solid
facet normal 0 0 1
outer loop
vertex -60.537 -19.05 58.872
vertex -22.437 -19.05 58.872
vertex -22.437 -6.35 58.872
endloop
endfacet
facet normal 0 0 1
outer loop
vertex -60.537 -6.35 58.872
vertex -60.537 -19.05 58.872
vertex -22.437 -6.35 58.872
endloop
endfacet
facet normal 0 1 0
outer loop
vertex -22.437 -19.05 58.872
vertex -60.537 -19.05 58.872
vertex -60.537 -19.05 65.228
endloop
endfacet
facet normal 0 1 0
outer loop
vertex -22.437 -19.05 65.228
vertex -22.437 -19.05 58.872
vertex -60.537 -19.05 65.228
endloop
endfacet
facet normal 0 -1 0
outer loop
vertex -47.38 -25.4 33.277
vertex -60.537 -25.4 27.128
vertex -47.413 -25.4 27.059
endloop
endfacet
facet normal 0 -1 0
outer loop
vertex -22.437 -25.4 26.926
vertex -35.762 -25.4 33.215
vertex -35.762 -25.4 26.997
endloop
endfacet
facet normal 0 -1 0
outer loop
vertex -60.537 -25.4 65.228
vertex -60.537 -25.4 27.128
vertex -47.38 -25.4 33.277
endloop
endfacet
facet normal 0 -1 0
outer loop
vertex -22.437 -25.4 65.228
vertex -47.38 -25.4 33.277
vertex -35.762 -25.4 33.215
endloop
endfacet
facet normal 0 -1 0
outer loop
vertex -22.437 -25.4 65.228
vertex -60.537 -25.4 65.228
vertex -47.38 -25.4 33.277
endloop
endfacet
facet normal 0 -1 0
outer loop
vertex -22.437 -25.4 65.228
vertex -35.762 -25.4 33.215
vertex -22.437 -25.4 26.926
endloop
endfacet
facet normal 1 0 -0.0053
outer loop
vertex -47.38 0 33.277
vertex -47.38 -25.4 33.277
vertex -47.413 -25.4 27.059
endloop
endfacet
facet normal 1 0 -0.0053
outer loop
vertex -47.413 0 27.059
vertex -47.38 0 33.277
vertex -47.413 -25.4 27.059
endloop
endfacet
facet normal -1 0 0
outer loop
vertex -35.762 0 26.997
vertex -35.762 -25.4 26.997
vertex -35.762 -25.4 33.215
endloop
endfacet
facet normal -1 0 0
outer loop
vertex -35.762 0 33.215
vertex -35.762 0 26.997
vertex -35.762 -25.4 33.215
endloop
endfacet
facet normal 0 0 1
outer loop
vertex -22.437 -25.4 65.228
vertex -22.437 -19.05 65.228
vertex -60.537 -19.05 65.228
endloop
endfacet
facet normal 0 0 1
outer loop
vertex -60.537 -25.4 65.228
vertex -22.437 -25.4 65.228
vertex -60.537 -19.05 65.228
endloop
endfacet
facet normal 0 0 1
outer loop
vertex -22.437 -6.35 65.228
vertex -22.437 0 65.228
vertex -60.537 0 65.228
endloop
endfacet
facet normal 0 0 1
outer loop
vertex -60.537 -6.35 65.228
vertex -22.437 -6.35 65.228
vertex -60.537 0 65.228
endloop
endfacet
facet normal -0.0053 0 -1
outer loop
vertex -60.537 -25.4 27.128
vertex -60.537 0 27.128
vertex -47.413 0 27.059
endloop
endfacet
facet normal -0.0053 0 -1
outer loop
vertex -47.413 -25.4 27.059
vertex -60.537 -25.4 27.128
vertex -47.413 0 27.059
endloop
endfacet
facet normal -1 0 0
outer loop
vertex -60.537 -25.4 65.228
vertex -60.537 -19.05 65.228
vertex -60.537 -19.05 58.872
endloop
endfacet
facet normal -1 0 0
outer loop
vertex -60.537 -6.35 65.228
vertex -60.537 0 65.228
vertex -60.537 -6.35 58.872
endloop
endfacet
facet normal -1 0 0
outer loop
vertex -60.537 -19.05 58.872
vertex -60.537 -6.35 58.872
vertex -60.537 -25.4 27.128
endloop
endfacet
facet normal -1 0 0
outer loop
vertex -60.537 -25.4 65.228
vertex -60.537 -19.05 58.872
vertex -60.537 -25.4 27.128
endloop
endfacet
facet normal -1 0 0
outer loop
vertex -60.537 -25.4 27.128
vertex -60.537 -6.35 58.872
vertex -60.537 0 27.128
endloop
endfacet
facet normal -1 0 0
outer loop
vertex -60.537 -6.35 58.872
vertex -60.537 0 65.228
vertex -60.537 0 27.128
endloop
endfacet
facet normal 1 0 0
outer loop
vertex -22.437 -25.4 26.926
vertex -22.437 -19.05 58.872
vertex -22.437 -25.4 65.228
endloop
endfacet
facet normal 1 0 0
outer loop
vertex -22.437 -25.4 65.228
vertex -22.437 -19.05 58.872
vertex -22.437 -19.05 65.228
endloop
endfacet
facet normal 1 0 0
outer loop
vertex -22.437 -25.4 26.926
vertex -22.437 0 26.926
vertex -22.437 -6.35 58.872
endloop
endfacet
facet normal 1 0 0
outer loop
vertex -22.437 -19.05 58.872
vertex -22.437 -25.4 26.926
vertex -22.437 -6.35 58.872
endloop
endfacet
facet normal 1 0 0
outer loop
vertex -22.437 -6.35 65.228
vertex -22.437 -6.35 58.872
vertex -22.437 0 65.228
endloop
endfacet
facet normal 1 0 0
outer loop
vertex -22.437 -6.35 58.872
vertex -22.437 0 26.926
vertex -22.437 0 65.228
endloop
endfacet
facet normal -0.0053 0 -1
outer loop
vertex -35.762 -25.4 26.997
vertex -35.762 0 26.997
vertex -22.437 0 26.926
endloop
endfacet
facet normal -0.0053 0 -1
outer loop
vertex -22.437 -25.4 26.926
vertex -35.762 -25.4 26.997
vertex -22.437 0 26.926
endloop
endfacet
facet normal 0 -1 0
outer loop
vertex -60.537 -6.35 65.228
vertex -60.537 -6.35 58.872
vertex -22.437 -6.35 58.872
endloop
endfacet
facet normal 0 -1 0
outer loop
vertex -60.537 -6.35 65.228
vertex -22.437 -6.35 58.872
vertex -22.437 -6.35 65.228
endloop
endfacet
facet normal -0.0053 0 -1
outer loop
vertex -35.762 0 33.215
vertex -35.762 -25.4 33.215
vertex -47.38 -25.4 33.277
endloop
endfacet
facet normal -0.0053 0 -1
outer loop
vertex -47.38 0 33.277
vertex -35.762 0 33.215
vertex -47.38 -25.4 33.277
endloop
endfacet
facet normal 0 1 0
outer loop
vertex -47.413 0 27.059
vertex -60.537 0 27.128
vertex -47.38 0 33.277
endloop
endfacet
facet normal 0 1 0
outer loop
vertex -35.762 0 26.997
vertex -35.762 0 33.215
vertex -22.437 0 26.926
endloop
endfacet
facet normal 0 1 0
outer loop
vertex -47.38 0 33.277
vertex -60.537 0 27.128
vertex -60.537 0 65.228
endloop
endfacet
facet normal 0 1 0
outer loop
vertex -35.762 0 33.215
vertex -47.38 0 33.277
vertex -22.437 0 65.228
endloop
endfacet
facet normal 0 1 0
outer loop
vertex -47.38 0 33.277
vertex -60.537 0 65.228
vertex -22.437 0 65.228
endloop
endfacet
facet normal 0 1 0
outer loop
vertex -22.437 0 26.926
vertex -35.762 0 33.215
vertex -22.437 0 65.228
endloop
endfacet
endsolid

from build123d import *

# Parameters (mm, degrees)
F1_DEPTH = 25.4
F3_DEPTH = 25.4
F4_W     = 12.7
F4_H     = 6.3569043029
F5_DEPTH = 38.1


with BuildPart() as f1:
    # F0 (on Front) → F1 (new body)
    with BuildSketch(Plane.XZ):
        Polygon((-22.4366684005, 65.2284603763), (-60.5366684005, 65.2284603763), (-60.5366684005, 27.1284603763), (-22.4366684005, 26.9258023975), align=None)
    extrude(amount=F1_DEPTH)

    # F2 (on face) → F3 (cut)
    with BuildSketch(Plane.XZ.offset(25.4)):
        Polygon((-47.3802936689, 33.2767914322), (-47.4133685962, 27.0586561397), (-35.7620950777, 26.9966817686), (-35.7620950777, 33.2149929902), align=None)
    extrude(amount=-F3_DEPTH, mode=Mode.SUBTRACT)

    # F4 (on face) → F5 (cut)
    with BuildSketch(Plane.YZ.offset(-22.4366684005)):
        with Locations((-12.7, 62.0500082249)):
            Rectangle(F4_W, F4_H)
    extrude(amount=-F5_DEPTH, mode=Mode.SUBTRACT)


solid = f1.part
